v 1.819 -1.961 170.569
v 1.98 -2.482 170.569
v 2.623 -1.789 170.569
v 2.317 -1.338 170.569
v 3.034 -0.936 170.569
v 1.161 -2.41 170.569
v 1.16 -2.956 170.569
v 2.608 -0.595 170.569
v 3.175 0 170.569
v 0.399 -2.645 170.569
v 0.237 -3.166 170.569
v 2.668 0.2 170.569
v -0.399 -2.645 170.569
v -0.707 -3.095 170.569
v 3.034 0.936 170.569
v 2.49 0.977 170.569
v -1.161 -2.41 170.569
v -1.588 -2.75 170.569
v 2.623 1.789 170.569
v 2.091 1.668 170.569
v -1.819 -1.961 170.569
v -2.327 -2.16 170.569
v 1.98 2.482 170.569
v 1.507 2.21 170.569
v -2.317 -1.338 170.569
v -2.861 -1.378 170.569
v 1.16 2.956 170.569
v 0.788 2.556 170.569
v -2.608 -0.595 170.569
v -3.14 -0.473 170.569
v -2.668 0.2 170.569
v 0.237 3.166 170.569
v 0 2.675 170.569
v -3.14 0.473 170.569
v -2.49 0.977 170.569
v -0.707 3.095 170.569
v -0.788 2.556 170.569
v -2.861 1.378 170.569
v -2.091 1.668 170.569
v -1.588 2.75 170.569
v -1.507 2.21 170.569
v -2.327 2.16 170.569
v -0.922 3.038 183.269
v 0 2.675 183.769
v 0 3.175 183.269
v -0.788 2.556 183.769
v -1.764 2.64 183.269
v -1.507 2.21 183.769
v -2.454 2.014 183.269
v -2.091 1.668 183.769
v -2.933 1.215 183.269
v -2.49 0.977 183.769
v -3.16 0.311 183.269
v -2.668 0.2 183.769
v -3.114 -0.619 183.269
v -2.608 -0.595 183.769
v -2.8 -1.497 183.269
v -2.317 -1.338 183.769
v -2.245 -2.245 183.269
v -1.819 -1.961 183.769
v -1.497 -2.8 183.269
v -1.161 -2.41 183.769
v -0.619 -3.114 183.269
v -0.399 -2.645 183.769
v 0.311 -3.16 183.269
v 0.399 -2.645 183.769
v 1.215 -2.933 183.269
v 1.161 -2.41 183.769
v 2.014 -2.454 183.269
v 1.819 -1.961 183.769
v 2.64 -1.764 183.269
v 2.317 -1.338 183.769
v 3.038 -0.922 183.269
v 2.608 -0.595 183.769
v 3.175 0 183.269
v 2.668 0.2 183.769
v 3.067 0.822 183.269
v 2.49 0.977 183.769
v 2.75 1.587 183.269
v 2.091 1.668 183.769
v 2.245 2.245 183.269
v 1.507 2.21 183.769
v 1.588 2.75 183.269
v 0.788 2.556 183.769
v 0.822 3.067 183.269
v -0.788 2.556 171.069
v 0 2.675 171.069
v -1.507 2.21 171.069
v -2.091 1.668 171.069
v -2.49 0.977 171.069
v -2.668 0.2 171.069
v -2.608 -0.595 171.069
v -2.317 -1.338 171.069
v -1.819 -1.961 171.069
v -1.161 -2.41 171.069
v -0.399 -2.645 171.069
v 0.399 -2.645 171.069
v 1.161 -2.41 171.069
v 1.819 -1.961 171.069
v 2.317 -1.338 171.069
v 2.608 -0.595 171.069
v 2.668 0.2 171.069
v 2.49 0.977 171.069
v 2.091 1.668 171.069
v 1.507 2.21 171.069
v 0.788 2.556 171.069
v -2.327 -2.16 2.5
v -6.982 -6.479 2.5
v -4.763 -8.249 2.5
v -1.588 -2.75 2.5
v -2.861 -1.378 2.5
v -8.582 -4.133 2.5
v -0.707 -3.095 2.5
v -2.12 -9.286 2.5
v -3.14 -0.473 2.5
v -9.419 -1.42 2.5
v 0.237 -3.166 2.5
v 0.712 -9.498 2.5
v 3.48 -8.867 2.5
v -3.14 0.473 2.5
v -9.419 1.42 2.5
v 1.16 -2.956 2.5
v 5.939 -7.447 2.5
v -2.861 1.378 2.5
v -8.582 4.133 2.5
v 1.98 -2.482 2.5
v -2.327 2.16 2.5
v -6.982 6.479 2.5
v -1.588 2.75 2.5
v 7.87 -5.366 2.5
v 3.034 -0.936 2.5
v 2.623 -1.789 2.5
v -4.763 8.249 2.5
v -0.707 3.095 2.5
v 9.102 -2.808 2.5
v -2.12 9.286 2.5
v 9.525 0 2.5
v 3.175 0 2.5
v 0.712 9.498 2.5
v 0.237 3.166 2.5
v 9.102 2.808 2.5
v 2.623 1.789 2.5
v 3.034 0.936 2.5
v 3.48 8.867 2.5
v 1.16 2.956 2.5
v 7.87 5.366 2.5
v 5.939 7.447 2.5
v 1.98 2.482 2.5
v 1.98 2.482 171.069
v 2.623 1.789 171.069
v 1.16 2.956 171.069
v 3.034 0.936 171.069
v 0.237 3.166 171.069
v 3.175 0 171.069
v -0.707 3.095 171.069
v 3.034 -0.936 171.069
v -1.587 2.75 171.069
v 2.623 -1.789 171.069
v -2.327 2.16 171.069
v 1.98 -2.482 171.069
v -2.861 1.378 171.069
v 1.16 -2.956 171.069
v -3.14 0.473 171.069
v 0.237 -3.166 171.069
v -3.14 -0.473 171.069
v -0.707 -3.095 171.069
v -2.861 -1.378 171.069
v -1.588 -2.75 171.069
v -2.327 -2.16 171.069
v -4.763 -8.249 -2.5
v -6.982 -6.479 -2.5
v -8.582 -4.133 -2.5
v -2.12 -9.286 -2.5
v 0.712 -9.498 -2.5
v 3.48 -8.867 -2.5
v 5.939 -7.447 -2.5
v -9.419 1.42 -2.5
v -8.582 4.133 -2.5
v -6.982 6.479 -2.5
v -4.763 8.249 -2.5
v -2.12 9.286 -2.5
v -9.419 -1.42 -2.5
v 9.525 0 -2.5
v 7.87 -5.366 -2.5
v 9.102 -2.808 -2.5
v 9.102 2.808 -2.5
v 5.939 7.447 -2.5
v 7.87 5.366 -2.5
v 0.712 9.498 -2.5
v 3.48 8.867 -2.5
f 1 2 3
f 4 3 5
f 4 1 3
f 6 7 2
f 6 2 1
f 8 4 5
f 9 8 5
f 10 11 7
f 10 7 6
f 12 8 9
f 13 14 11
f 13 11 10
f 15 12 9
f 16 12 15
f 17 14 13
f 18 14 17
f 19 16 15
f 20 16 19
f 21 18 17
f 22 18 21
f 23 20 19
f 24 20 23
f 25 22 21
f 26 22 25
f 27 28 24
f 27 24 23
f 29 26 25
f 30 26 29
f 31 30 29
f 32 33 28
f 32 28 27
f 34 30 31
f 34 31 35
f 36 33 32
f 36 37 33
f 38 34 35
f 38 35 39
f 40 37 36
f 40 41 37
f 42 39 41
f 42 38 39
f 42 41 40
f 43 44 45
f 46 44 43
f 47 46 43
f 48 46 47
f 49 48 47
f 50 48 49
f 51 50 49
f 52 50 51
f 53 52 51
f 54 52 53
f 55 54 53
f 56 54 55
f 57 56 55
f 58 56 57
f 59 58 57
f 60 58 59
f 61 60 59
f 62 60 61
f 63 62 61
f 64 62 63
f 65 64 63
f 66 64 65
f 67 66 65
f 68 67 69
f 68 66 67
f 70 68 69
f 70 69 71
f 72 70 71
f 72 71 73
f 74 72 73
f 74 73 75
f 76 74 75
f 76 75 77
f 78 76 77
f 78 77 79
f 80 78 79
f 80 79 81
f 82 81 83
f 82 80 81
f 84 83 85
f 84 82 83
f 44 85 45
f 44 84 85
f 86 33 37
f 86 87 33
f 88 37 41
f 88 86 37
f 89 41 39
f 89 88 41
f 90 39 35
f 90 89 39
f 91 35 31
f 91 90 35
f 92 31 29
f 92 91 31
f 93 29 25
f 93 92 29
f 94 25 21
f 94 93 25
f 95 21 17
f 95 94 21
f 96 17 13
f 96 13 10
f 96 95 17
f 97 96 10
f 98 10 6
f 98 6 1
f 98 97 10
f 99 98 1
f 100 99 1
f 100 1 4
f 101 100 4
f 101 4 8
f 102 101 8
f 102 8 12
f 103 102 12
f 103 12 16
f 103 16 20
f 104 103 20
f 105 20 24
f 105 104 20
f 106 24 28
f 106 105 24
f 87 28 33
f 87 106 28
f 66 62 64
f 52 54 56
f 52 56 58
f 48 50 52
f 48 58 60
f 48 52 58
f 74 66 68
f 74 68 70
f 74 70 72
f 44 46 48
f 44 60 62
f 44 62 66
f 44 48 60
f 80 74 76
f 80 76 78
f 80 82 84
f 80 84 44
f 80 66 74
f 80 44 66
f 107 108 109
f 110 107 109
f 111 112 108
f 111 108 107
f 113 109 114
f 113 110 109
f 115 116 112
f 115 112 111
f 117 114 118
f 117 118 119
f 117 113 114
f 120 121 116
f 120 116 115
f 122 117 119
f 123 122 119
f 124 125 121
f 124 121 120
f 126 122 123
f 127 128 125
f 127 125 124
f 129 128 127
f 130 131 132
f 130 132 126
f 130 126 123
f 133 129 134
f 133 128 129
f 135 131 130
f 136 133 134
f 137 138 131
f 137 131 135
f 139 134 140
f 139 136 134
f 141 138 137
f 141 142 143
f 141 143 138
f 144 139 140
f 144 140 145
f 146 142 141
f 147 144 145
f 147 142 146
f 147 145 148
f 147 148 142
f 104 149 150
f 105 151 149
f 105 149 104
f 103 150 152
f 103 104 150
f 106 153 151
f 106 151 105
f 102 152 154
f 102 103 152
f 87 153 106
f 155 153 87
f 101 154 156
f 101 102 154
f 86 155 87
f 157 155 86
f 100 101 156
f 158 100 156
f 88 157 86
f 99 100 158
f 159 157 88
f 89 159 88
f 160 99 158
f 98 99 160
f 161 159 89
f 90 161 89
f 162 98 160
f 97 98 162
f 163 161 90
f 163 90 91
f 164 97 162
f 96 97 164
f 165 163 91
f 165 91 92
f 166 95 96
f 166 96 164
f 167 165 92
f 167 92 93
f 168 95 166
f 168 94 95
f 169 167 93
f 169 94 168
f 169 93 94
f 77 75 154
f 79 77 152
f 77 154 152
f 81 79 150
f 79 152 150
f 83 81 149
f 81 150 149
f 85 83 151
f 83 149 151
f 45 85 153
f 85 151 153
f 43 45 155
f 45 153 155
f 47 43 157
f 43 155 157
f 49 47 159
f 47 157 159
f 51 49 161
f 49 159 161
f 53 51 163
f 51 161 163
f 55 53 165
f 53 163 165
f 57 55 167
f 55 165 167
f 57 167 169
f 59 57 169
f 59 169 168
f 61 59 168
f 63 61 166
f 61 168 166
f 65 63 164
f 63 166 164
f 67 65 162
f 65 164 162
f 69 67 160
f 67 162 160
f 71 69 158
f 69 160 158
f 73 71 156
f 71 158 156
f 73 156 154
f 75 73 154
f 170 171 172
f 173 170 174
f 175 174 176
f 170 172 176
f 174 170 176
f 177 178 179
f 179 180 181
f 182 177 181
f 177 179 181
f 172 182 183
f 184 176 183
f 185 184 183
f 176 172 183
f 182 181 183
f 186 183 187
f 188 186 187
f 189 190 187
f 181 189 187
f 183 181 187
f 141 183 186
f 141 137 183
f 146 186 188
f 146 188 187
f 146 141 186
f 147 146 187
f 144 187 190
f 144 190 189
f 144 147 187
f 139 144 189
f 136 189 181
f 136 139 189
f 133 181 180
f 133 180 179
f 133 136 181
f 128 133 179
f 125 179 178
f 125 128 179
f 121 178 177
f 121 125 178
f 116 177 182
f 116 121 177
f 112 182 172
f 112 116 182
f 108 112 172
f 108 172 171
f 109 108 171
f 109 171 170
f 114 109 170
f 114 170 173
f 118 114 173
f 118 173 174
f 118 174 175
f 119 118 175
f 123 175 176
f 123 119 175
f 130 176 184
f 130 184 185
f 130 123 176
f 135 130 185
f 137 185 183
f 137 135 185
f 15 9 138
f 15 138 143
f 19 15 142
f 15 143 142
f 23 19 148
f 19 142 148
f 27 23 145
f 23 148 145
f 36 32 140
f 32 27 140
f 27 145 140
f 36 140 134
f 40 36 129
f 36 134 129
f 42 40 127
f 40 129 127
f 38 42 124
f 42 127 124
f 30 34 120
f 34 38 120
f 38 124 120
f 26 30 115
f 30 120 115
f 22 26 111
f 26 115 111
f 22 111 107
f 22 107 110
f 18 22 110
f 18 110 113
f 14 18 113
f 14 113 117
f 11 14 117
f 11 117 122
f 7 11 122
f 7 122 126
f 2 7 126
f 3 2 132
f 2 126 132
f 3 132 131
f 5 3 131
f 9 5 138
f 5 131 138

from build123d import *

# Parameters (mm, degrees)
SKETCH1_R      = 3.175
EXTRUDE1_DEPTH = 183.769
SKETCH2_R      = 9.525
PISTON_DEPTH   = 2.5


with BuildPart() as part:
    # Sketch1 → Extrude1 (new body)
    with BuildSketch(Plane.XY):
        Circle(SKETCH1_R)
    extrude(amount=EXTRUDE1_DEPTH)

    # Sketch2 → Piston (add, symmetric)
    with BuildSketch(Plane.XY):
        Circle(SKETCH2_R)
    extrude(amount=PISTON_DEPTH, both=True)

    # Sketch3 → Threads (revolve, cut)
    with BuildSketch(Plane(origin=(0, 0, 0), x_dir=(0, 0, -1), z_dir=(1, 0, 0))):
        Polygon((-183.769, 9.525), (-170.569, 9.525), (-170.569, 2.675), (-171.069, 2.675), (-171.069, 3.175), (-183.269, 3.175), (-183.769, 2.675), align=None)
    revolve(axis=Axis((0, 0, 0), (0, 0, 1)), mode=Mode.SUBTRACT)


solid = part.part
